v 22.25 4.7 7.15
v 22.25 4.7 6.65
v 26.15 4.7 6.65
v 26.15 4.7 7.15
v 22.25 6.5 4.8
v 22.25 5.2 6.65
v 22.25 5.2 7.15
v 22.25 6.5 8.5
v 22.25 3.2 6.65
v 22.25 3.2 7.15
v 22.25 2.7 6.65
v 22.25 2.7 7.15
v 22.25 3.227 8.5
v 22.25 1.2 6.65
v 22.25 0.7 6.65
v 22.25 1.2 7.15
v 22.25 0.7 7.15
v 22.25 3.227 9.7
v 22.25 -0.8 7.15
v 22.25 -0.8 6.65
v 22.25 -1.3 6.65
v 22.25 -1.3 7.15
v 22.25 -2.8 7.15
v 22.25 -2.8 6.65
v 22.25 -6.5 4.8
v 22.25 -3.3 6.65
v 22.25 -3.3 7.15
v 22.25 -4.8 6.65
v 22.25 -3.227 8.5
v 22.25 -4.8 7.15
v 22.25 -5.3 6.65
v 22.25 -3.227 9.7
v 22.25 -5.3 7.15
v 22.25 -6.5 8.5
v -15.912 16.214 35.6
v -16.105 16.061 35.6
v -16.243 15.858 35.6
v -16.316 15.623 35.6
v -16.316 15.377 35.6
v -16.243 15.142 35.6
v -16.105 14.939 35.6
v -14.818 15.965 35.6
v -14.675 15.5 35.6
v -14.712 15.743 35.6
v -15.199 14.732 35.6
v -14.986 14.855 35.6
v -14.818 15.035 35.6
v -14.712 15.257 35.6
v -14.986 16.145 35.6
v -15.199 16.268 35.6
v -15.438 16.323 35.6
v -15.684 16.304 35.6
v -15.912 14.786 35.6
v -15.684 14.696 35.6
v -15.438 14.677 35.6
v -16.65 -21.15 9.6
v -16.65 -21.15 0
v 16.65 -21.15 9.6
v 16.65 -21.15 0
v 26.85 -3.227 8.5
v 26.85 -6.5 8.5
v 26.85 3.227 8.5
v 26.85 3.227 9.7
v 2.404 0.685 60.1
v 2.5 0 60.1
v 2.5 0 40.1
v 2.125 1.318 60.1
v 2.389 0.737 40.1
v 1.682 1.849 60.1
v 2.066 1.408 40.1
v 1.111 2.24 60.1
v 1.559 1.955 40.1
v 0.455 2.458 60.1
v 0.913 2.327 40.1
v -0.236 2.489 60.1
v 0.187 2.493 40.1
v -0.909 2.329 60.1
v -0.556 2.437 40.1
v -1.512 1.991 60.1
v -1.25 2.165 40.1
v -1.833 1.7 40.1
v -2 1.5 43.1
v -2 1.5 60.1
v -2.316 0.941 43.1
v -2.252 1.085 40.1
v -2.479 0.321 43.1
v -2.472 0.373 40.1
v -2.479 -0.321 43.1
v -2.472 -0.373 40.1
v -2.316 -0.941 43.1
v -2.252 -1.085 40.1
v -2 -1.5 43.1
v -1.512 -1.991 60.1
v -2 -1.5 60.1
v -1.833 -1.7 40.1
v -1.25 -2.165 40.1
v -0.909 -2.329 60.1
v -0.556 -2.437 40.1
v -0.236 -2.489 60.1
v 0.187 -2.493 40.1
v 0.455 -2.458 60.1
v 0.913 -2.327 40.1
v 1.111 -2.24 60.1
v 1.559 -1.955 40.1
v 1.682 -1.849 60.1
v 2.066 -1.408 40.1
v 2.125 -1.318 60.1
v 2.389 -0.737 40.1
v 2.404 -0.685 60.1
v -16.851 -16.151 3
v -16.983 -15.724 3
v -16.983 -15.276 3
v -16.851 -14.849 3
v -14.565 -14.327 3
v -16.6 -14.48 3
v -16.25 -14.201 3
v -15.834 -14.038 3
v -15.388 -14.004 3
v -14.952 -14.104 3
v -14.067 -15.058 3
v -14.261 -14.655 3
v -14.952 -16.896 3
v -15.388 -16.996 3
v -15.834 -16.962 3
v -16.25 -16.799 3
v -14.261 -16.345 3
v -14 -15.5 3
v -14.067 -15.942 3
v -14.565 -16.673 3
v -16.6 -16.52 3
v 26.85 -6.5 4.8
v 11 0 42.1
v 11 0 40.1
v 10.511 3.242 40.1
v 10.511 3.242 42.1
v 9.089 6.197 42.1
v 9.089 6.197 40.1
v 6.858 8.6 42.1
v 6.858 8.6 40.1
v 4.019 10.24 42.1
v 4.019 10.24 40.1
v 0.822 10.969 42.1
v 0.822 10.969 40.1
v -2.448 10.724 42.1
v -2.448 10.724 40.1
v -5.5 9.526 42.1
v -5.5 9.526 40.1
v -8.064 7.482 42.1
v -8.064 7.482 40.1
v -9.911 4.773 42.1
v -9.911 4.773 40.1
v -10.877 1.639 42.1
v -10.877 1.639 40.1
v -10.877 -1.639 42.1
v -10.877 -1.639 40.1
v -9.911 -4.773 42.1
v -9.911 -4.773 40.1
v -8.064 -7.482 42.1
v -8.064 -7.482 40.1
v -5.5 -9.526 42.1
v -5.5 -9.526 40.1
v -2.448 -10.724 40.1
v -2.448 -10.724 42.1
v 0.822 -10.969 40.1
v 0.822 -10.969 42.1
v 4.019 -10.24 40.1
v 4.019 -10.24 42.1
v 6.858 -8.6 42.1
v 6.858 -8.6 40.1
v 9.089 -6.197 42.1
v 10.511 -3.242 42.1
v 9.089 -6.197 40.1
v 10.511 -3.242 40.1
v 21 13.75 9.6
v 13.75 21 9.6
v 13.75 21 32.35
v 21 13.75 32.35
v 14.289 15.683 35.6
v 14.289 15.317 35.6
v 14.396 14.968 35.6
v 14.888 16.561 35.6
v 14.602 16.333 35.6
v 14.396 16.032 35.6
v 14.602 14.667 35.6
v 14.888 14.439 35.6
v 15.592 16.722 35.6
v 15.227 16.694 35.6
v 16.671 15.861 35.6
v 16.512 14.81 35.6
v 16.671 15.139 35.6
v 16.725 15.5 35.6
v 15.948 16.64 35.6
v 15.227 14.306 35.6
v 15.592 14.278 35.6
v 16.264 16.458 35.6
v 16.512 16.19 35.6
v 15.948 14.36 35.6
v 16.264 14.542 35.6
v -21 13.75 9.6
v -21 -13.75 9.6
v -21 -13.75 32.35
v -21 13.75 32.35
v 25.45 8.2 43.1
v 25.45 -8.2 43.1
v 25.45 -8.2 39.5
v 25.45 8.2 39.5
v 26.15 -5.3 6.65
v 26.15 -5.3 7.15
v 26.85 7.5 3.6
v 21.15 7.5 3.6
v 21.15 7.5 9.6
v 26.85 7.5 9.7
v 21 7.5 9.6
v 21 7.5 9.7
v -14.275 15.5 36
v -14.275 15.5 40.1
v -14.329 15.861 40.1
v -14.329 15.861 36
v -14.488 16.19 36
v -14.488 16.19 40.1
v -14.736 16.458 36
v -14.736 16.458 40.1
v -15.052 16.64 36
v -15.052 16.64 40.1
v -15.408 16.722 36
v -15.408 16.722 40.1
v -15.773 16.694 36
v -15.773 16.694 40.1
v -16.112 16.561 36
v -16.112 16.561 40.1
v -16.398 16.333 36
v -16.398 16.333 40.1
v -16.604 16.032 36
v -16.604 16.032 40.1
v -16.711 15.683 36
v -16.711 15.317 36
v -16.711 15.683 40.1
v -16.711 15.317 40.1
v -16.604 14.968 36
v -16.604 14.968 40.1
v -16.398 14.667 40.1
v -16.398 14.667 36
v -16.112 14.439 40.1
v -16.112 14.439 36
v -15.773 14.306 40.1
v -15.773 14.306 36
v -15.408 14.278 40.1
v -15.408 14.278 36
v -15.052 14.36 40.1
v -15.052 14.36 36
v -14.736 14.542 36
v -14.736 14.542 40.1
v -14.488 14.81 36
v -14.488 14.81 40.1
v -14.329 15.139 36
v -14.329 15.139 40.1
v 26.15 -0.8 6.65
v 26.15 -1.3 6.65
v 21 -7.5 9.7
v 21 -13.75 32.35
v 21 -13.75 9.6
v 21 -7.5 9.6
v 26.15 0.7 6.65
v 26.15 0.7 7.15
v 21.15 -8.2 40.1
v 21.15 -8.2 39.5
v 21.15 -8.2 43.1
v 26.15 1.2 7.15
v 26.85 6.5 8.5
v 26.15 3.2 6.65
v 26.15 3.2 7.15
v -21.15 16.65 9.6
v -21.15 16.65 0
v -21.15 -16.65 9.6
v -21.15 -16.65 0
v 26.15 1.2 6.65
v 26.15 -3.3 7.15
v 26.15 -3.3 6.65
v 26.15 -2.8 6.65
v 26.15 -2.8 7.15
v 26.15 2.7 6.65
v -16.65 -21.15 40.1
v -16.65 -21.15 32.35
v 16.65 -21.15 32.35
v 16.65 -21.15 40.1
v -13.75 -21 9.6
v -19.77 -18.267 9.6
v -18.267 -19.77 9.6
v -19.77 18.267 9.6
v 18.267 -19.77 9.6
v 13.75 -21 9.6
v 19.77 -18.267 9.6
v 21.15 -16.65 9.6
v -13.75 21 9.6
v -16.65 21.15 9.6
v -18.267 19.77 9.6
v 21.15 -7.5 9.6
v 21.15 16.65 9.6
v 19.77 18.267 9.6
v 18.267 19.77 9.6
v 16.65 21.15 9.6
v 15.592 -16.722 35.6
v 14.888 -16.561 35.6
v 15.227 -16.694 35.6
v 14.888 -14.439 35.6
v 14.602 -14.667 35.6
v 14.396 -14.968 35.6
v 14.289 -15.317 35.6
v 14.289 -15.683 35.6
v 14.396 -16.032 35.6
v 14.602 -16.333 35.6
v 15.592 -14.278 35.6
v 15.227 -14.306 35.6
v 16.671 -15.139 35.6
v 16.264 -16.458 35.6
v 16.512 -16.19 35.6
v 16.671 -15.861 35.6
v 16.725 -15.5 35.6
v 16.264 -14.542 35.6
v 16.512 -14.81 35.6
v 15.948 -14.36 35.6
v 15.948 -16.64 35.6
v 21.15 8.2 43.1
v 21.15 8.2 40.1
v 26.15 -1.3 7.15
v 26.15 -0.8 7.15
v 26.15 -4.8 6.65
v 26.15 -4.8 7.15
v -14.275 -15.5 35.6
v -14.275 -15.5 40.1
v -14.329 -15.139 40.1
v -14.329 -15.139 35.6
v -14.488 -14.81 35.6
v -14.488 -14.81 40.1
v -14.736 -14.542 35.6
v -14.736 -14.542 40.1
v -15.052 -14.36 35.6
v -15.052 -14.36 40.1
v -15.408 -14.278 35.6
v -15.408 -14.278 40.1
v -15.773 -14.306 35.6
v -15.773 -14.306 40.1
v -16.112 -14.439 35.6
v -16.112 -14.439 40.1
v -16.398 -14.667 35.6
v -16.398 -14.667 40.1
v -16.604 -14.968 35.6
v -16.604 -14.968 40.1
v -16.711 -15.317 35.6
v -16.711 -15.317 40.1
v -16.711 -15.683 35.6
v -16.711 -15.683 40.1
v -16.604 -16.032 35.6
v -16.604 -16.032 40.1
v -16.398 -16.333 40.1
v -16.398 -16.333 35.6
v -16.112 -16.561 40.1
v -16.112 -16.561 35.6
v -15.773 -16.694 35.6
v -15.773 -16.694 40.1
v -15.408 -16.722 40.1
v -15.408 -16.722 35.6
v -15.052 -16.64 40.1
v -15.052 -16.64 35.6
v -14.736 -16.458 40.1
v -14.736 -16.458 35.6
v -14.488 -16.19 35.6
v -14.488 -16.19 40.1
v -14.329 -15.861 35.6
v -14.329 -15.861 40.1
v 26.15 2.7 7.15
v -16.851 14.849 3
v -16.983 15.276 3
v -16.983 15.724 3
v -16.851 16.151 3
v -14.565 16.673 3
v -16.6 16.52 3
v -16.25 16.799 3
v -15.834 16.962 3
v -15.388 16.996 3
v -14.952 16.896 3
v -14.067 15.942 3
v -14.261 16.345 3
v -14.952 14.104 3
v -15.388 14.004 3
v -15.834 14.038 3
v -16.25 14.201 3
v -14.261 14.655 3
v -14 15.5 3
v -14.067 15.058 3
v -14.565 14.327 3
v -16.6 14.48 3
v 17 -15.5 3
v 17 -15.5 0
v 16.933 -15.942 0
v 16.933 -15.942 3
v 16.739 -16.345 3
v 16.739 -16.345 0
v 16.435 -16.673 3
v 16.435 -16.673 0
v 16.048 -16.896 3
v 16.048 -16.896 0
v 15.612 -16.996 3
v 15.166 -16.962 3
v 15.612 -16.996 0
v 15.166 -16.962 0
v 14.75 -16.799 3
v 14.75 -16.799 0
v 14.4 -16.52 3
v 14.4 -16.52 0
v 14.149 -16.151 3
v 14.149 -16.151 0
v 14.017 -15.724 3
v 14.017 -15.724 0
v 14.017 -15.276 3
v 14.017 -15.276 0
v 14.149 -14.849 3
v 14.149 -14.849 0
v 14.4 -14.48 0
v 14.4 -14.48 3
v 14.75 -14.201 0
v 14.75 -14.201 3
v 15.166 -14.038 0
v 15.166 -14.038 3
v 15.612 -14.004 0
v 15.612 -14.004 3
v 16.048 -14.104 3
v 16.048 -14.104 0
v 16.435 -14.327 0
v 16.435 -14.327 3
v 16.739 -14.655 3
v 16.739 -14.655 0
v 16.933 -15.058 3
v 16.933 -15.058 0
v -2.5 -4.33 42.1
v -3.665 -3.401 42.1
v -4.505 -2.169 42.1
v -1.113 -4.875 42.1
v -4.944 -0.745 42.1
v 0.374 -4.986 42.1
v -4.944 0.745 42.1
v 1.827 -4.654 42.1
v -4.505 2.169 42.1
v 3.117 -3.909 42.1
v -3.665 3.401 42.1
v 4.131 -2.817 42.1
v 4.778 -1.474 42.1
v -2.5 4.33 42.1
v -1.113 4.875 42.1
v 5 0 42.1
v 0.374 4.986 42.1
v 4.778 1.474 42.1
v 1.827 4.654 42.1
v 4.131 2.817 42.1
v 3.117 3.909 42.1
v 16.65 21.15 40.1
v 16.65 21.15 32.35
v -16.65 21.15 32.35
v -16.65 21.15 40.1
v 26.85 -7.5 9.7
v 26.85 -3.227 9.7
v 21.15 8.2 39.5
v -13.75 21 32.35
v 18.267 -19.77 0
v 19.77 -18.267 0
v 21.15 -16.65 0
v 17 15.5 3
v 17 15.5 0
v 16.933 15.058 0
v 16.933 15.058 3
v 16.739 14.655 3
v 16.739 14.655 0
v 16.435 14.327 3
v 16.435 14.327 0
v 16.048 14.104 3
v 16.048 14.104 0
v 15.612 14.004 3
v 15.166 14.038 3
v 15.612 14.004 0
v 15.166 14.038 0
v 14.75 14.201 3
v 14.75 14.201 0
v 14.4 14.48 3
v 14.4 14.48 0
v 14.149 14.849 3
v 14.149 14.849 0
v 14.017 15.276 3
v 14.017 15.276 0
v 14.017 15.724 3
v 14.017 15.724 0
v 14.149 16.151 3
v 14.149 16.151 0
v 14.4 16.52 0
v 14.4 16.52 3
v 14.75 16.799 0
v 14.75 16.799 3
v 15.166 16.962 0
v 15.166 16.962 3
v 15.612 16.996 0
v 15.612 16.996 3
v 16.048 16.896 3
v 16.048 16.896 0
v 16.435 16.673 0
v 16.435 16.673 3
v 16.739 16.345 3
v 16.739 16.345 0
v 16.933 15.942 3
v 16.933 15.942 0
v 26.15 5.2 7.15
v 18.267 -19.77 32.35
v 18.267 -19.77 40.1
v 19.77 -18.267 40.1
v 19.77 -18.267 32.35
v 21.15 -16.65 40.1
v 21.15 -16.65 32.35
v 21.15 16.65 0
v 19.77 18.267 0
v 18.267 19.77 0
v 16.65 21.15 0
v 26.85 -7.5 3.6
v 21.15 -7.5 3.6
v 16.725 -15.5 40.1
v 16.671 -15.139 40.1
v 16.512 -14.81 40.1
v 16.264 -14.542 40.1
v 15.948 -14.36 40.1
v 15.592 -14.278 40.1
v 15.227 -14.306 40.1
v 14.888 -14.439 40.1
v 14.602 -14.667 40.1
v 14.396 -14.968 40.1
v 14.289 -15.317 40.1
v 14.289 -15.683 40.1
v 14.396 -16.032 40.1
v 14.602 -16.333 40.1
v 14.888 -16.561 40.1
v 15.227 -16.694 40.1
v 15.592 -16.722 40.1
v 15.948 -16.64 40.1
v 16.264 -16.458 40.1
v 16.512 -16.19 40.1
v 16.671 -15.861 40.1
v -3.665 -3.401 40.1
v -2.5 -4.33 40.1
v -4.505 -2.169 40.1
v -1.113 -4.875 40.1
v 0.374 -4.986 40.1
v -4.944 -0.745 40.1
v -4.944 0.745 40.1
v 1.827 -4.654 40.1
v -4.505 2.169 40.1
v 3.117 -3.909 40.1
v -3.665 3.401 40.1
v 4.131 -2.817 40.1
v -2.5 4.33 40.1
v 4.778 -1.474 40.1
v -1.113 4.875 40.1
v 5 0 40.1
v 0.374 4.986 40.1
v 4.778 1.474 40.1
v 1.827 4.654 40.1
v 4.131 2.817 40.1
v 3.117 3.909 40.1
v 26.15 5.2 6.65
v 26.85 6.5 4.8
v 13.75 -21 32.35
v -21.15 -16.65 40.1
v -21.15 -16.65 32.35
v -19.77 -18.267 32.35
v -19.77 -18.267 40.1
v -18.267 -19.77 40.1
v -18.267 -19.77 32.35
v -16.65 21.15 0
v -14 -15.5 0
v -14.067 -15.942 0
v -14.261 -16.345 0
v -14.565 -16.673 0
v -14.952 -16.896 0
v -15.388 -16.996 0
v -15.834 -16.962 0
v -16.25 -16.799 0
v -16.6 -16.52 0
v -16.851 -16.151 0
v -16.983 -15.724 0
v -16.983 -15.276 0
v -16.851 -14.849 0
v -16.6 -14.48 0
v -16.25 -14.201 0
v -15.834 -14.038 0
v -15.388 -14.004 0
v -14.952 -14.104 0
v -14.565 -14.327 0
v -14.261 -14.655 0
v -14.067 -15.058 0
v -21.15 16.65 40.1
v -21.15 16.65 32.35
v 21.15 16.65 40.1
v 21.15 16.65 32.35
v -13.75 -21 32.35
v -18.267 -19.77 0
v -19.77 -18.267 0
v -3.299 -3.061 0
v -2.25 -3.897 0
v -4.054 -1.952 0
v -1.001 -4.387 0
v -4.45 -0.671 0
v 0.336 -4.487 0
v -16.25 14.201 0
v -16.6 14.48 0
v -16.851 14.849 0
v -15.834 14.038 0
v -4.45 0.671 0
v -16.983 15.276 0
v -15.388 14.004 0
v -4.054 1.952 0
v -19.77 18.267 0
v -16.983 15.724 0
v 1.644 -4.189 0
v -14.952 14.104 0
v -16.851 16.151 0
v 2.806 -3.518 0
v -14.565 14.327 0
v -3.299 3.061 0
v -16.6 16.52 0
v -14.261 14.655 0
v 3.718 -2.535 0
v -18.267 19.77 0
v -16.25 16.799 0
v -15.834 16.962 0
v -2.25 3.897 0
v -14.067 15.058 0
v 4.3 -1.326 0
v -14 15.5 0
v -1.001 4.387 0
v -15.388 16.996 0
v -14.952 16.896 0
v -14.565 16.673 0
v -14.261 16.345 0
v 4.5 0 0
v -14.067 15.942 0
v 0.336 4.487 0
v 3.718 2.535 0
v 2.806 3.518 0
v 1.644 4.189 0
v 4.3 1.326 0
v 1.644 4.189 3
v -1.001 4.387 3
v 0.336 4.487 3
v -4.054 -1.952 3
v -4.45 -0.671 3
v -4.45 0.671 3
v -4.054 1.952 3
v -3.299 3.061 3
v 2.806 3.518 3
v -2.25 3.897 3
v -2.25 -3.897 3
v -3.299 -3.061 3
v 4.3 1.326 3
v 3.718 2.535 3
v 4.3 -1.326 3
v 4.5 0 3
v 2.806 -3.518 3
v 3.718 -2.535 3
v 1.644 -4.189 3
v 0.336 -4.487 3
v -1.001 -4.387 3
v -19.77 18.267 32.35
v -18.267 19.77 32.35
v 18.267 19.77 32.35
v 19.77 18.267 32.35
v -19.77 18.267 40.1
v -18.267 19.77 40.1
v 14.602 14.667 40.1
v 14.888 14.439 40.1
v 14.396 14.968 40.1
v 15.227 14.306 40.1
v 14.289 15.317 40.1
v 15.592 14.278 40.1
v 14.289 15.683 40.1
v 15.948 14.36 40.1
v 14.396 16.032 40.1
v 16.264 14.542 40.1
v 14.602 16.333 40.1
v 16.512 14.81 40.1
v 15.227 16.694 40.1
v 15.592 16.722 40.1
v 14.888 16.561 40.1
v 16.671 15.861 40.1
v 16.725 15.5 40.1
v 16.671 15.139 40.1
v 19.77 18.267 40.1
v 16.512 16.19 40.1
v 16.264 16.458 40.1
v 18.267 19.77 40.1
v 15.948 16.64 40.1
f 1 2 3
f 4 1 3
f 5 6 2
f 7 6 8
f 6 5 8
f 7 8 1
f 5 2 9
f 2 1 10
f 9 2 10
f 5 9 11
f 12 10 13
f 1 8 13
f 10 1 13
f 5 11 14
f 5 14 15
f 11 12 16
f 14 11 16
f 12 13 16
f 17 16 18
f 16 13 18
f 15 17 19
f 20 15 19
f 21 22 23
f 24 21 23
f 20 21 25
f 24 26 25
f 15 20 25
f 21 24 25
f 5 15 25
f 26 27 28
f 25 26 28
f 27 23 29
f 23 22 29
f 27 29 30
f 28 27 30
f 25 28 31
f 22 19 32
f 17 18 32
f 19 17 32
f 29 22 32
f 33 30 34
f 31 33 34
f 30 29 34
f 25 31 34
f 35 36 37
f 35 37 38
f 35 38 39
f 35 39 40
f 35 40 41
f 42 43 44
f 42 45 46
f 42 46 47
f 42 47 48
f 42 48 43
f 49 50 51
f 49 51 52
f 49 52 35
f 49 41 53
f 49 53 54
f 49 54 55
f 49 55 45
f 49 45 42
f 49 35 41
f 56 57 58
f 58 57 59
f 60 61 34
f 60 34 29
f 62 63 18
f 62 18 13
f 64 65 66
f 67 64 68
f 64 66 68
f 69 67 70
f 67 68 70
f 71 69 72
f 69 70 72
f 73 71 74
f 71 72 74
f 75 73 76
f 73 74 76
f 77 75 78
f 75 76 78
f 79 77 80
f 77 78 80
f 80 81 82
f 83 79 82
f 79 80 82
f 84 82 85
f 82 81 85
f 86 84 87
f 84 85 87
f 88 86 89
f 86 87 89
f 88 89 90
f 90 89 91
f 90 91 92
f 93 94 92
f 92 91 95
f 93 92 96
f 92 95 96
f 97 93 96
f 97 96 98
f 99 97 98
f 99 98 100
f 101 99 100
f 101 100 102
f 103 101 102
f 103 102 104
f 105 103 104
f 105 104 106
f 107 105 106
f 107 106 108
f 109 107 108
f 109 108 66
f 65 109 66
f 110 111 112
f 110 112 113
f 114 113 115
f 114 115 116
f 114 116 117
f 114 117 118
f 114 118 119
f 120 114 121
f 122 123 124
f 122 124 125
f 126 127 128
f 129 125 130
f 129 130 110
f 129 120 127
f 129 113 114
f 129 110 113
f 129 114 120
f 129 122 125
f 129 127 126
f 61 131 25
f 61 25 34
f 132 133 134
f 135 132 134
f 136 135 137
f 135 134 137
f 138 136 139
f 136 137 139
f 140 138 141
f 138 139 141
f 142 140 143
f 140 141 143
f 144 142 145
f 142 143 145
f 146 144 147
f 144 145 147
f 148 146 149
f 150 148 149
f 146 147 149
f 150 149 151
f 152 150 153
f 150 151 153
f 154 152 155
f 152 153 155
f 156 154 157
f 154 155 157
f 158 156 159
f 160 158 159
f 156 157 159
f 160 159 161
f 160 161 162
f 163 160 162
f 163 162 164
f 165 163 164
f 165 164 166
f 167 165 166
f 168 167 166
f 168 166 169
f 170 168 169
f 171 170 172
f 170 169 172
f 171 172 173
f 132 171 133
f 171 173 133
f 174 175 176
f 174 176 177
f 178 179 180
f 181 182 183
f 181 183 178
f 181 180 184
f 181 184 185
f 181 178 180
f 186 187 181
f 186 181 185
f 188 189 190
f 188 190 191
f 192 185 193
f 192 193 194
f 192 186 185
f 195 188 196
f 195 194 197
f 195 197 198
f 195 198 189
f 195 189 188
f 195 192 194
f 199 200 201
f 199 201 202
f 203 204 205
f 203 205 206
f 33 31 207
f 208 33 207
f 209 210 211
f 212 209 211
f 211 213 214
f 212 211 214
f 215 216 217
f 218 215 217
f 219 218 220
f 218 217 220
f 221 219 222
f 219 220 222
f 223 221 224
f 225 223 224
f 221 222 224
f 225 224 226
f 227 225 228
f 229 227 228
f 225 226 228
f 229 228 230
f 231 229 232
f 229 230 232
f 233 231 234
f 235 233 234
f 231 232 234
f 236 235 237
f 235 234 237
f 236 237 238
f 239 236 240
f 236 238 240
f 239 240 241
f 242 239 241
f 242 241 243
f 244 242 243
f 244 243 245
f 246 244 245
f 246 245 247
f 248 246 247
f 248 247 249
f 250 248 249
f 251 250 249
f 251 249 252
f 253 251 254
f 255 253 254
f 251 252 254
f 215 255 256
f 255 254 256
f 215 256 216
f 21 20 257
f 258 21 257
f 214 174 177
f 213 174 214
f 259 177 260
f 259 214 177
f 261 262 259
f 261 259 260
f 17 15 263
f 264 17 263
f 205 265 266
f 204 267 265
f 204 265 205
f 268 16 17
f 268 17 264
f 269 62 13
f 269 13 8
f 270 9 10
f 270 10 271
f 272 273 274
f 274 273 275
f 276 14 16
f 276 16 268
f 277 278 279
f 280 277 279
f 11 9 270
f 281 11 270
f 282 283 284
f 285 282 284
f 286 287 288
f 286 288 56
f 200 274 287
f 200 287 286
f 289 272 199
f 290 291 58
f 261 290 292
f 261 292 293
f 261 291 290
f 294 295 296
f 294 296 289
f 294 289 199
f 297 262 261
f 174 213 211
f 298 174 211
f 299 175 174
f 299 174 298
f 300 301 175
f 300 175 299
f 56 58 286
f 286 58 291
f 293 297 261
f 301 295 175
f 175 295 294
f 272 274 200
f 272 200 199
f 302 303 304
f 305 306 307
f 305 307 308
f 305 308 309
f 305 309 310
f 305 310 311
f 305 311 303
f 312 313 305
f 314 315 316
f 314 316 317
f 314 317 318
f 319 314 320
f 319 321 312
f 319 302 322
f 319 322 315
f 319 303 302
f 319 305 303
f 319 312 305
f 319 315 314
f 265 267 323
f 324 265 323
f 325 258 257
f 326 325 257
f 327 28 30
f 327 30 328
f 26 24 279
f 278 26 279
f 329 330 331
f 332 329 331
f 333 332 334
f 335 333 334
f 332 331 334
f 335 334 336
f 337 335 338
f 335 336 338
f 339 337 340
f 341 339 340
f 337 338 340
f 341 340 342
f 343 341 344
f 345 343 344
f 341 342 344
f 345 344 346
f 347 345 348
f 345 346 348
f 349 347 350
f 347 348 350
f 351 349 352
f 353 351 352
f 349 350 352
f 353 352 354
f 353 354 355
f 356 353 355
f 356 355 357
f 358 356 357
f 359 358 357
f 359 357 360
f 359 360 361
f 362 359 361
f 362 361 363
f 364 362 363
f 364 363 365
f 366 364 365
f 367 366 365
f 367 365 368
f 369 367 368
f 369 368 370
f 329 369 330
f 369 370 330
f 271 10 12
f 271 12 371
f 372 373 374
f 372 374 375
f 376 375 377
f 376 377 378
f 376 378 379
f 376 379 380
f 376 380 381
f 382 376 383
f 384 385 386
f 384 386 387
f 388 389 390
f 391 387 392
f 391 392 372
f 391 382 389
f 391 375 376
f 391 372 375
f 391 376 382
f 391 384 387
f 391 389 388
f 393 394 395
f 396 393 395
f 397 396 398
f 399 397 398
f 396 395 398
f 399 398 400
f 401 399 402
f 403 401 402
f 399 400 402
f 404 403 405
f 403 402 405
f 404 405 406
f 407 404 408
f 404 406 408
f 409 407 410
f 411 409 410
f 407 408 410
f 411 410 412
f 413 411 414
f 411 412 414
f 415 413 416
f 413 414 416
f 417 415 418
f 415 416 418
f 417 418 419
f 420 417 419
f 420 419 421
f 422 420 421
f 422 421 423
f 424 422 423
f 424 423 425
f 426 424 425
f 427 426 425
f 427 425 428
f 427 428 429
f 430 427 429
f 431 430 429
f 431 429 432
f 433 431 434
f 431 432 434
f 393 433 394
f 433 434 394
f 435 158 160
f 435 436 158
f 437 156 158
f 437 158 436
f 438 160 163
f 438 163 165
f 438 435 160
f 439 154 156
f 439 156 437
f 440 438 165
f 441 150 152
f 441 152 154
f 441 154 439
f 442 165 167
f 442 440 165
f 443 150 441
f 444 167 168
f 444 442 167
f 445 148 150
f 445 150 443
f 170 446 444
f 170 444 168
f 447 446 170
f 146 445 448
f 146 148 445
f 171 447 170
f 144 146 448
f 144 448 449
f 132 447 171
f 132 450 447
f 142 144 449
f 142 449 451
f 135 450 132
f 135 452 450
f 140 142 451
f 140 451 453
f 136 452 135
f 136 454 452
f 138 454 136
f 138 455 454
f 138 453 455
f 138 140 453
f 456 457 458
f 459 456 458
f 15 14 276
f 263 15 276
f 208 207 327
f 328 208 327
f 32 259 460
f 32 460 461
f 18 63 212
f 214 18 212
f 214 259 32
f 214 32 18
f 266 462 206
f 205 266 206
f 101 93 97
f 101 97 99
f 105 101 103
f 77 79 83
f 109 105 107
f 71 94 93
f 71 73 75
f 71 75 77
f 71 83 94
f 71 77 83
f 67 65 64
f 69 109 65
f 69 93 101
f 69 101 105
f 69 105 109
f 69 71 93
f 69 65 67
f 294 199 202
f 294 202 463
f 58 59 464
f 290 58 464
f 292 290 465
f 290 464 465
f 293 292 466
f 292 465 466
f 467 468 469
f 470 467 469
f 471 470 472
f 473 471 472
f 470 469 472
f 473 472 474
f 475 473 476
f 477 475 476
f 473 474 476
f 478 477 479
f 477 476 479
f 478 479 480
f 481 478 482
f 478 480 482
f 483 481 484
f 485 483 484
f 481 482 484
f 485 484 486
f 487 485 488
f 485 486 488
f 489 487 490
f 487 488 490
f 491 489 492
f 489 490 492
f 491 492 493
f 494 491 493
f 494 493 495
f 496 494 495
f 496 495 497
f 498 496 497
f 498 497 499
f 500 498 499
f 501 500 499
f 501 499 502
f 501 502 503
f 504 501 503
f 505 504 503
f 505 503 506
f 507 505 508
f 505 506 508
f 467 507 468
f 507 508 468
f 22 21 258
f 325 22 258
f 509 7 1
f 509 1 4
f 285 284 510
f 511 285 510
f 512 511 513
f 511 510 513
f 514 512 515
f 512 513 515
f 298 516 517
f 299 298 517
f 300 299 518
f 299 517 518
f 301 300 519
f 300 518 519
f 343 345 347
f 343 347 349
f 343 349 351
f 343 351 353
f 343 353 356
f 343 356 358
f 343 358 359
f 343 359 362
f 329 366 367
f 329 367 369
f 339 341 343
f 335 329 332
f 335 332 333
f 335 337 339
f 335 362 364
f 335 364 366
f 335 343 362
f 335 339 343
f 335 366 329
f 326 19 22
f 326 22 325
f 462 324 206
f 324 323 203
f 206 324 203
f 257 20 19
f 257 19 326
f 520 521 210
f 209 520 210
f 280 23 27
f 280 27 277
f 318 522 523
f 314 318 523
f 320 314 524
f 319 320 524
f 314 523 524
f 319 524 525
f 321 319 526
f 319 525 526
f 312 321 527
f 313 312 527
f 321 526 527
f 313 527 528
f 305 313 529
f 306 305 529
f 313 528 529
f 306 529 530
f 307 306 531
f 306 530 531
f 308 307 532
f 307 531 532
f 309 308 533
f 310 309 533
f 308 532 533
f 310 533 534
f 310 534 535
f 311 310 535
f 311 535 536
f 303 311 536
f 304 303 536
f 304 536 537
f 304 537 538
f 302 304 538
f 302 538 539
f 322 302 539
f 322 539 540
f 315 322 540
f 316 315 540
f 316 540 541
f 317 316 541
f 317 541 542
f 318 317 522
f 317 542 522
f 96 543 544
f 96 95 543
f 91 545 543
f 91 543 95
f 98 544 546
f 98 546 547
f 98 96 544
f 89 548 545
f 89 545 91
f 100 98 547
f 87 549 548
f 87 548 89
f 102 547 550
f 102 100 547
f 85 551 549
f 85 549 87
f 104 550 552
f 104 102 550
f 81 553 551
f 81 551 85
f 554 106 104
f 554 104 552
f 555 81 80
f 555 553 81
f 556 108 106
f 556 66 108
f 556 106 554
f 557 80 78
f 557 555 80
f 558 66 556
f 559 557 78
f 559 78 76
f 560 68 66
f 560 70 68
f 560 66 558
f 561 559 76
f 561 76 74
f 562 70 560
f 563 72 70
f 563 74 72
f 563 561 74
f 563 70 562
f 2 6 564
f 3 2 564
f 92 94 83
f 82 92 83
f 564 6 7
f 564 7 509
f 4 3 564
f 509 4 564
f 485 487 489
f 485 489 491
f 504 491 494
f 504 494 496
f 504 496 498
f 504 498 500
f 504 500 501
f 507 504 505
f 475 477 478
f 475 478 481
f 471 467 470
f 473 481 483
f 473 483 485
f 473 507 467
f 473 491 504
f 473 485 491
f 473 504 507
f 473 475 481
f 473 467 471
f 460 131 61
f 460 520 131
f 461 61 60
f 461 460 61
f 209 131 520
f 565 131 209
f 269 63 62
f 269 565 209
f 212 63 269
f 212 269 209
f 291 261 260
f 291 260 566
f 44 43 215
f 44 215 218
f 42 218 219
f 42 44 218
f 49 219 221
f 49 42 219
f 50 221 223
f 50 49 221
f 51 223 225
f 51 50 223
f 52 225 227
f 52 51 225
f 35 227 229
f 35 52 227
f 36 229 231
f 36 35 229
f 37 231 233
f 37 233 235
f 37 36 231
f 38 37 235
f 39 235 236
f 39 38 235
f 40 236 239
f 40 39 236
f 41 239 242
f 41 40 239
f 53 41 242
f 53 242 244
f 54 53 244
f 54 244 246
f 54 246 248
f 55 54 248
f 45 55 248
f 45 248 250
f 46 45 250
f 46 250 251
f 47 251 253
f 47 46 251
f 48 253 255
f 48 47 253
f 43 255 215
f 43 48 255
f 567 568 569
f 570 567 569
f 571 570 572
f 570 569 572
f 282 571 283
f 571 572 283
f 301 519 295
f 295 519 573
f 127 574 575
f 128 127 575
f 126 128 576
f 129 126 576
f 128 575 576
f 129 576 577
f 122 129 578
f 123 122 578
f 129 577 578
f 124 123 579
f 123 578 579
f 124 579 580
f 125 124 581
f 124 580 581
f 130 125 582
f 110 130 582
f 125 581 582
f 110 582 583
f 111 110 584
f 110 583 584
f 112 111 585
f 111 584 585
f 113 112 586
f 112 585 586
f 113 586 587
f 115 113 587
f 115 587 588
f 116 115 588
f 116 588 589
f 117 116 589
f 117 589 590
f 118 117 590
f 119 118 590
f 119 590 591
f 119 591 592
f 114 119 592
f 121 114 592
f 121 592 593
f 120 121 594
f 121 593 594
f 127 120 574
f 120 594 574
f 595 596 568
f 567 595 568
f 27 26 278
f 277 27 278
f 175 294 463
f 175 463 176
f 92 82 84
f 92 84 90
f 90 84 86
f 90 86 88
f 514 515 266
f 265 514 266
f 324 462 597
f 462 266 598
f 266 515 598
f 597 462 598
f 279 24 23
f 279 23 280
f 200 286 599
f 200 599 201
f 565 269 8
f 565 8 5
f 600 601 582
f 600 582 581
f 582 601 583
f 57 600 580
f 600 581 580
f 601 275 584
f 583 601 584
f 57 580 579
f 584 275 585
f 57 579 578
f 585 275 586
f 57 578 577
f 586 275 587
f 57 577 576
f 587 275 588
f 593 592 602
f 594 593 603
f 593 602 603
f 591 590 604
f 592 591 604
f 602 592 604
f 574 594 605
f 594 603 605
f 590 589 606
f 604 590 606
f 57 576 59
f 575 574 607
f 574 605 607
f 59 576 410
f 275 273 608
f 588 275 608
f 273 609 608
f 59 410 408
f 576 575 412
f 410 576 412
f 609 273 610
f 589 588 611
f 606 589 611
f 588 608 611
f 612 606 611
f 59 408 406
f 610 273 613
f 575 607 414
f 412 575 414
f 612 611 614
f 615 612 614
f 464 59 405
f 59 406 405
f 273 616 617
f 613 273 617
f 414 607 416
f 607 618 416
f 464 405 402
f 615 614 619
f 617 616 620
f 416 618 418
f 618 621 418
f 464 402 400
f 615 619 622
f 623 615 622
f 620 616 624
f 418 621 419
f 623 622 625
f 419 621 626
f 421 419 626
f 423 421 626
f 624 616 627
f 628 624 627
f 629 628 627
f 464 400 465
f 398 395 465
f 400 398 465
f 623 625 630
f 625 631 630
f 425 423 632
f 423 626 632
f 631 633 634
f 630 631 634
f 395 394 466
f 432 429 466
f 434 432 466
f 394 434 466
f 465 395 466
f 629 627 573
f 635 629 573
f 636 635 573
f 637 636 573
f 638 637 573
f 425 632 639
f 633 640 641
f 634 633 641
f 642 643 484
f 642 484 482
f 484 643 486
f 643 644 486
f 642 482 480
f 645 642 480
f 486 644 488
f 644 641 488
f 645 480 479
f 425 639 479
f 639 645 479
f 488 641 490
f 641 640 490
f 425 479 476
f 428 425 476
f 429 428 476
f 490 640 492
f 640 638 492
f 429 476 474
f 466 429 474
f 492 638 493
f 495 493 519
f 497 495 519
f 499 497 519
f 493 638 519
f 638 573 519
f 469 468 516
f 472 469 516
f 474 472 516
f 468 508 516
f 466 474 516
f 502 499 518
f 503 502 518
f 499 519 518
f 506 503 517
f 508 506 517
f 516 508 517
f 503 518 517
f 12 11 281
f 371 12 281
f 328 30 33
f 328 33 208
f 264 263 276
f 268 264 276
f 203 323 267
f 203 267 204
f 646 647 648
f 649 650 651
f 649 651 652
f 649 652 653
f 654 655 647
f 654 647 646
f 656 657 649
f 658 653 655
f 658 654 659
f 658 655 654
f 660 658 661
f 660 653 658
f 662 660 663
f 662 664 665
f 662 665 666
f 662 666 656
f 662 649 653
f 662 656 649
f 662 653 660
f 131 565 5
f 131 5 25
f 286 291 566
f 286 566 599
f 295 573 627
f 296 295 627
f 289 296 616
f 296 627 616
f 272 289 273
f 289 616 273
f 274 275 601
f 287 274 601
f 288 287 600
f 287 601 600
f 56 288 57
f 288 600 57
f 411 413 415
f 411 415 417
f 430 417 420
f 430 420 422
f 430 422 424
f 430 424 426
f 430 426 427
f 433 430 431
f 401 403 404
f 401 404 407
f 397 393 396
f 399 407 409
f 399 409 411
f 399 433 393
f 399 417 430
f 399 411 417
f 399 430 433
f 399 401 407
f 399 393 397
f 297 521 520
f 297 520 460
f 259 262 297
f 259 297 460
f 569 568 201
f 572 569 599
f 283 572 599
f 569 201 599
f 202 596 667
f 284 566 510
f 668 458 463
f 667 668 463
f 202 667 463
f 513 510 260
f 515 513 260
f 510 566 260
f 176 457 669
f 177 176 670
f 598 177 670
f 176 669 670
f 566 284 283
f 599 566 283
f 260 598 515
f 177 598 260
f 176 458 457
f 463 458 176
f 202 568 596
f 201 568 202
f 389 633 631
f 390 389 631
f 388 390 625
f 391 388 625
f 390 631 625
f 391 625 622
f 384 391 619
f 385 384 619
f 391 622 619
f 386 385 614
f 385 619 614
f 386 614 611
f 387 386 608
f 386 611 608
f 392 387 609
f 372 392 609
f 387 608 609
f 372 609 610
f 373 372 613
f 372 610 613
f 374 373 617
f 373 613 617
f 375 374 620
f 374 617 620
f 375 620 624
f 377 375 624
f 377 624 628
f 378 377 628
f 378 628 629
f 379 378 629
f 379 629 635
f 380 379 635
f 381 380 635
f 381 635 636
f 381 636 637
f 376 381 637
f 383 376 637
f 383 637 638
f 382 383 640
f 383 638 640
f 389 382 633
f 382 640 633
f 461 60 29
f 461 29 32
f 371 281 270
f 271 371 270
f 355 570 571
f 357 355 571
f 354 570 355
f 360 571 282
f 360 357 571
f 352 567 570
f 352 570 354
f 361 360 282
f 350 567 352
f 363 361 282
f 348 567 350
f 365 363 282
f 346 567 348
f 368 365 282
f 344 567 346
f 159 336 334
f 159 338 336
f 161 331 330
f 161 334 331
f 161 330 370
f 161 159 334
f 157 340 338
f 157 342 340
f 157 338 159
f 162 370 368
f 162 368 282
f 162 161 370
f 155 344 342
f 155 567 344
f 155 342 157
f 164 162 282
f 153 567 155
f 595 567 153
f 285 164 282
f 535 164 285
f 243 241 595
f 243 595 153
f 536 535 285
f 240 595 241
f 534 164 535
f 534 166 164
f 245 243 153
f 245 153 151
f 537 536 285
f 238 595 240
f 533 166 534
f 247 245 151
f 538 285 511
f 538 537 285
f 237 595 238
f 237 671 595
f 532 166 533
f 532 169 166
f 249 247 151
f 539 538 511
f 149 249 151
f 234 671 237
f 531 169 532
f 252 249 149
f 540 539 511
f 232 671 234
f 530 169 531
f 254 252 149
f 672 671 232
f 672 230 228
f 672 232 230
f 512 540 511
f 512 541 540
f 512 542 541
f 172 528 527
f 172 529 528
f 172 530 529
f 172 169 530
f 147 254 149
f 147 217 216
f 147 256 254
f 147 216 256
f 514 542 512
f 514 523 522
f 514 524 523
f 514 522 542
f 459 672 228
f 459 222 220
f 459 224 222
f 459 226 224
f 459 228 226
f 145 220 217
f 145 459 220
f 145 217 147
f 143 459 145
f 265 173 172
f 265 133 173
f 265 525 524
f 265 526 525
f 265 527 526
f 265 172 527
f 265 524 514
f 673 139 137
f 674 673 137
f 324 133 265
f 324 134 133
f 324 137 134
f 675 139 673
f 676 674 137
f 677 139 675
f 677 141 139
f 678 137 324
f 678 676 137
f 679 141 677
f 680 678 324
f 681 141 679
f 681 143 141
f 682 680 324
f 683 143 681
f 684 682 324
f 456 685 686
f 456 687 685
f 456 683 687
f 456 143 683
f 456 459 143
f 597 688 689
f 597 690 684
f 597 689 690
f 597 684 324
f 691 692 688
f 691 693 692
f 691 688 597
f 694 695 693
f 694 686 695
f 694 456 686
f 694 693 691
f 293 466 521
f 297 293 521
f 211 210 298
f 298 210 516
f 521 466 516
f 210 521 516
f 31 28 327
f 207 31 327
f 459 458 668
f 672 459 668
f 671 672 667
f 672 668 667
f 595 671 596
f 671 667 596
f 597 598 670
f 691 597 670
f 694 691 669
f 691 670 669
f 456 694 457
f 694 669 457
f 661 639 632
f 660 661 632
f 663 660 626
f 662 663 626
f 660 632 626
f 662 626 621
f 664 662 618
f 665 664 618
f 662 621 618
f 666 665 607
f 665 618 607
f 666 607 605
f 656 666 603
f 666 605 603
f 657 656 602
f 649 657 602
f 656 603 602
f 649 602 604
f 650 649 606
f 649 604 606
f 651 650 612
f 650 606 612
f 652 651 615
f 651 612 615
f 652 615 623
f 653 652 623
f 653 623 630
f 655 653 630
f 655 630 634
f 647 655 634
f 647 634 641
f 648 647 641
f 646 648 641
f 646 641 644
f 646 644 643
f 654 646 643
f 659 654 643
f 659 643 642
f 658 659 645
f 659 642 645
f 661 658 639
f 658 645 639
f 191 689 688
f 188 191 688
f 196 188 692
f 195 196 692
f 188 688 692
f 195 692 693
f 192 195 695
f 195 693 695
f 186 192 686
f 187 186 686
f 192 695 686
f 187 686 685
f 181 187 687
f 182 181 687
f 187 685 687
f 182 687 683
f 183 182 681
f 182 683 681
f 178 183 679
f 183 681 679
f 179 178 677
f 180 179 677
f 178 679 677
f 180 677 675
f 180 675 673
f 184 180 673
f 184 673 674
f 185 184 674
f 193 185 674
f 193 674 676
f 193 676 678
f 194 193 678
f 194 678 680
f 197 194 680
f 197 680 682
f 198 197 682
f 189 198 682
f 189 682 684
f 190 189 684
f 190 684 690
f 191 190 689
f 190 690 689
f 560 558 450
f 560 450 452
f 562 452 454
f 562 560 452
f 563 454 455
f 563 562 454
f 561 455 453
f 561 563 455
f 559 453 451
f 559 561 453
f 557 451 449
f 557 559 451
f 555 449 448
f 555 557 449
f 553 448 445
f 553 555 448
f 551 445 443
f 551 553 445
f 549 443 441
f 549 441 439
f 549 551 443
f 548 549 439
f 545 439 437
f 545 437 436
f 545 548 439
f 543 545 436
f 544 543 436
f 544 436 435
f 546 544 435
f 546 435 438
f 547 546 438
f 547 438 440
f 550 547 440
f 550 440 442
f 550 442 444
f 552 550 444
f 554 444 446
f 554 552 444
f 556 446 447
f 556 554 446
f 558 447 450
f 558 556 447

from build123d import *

# Parameters (mm, degrees)
BOX_W           = 4
BOX_H           = 0.5
BOX_DEPTH       = 0.5
ARRAY_Y_COUNT   = 6
ARRAY_Y_PITCH   = 2
SKETCH017_W     = 15
SKETCH017_H     = 6.1
PAD008_DEPTH    = 6.7
POCKET007_DEPTH = 4.6
PAD002_DEPTH    = 9.6
PAD003_DEPTH    = 22.75
PAD004_DEPTH    = 7.75
SKETCH010_R     = 1.225
POCKET003_DEPTH = 4.5
SKETCH011_R     = 11
SKETCH011_R_2   = 5
PAD005_DEPTH    = 2
SKETCH012_R     = 2.5
PAD006_DEPTH    = 20
SKETCH013_W     = 0.5
SKETCH013_H     = 3
POCKET004_DEPTH = 17
SKETCH014_R     = 1.5
SKETCH014_R_2   = 4.5
POCKET005_DEPTH = 3
CHAMFER004_SIZE = 0.4
SKETCH015_W     = 4.3
SKETCH015_H     = 16.4
PAD007_DEPTH    = 3.6
SKETCH016_W     = 16.4
SKETCH016_H     = 6
POCKET006_DEPTH = 1


with BuildPart() as pins:
    # Box → Box (new body)
    with BuildSketch(Plane.XY):
        with Locations((2, 0.25)):
            Rectangle(BOX_W, BOX_H)
    extrude(amount=BOX_DEPTH)

    # Array Y: pins ×6


with BuildPart() as pins_1:
    add(pins.part)
    with Locations(*[(0, i * ARRAY_Y_PITCH, 0) for i in range(1, ARRAY_Y_COUNT)]):
        add(pins.part)


with BuildPart() as pins_2:
    # Array placement: moved
    add(pins_1.part.moved(Location((2, -5.3, 0))))


with BuildPart() as connector:
    # Sketch017 → Pad008 (new body)
    with BuildSketch(Plane.YZ):
        Rectangle(SKETCH017_W, SKETCH017_H)
    extrude(amount=PAD008_DEPTH)

    # Sketch018 (on Face6 of Pad008) → Pocket007 (cut)
    with BuildSketch(Plane.YZ.offset(6.7)):
        Polygon((-6.5, 1.85), (-3.227377, 1.85), (-3.227377, 3.85), (3.227377, 3.85), (3.227377, 1.85), (6.5, 1.85), (6.5, -1.85), (-6.5, -1.85), align=None)
    extrude(amount=-POCKET007_DEPTH, mode=Mode.SUBTRACT)

    # Fusion001: union pins
    add(pins_2.part)


with BuildPart() as connector_1:
    # Fusion001 placement: moved
    add(connector.part.moved(Location((20.15, 0, 6.65))))


with BuildPart() as motor_with_connector:
    # Sketch007 → Pad002 (new body)
    with BuildSketch(Plane.XY):
        with BuildLine():
            Line((-16.65, -21.15), (16.65, -21.15))
            ThreePointArc((16.65, -21.15), (19.033457, -19.033457), (21.15, -16.65))
            Line((21.15, -16.65), (21.15, 16.65))
            ThreePointArc((21.15, 16.65), (19.033457, 19.033457), (16.65, 21.15))
            Line((16.65, 21.15), (-16.65, 21.15))
            ThreePointArc((-16.65, 21.15), (-19.033457, 19.033457), (-21.15, 16.65))
            Line((-21.15, 16.65), (-21.15, -16.65))
            ThreePointArc((-21.15, -16.65), (-19.033457, -19.033457), (-16.65, -21.15))
        make_face()
    extrude(amount=PAD002_DEPTH)

    # Sketch008 (on Face10 of Pad002) → Pad003 (new body)
    with BuildSketch(Plane.XY.offset(9.6)):
        Polygon((-21, -13.75), (-21, 13.75), (-13.75, 21), (13.75, 21), (21, 13.75), (21, -13.75), (13.75, -21), (-13.75, -21), align=None)
    extrude(amount=PAD003_DEPTH)

    # Sketch009 (on Face19 of Pad003) → Pad004 (new body)
    with BuildSketch(Plane.XY.offset(32.35)):
        with BuildLine():
            Line((-16.65, -21.15), (16.65, -21.15))
            ThreePointArc((16.65, -21.15), (19.033457, -19.033457), (21.15, -16.65))
            Line((21.15, -16.65), (21.15, 16.65))
            ThreePointArc((21.15, 16.65), (19.033457, 19.033457), (16.65, 21.15))
            Line((16.65, 21.15), (-16.65, 21.15))
            ThreePointArc((-16.65, 21.15), (-19.033457, 19.033457), (-21.15, 16.65))
            Line((-21.15, 16.65), (-21.15, -16.65))
            ThreePointArc((-21.15, -16.65), (-19.033457, -19.033457), (-16.65, -21.15))
        make_face()
    extrude(amount=PAD004_DEPTH)

    # Sketch010 (on Face28 of Pad004) → Pocket003 (cut)
    with BuildSketch(Plane.XY.offset(40.1)):
        with Locations((-15.5, 15.5)):
            Circle(SKETCH010_R)
        with Locations((15.5, 15.5)):
            Circle(SKETCH010_R)
        with Locations((15.5, -15.5)):
            Circle(SKETCH010_R)
        with Locations((-15.5, -15.5)):
            Circle(SKETCH010_R)
    extrude(amount=-POCKET003_DEPTH, mode=Mode.SUBTRACT)

    # Sketch011 (on Face28 of Pocket003) → Pad005 (new body)
    with BuildSketch(Plane.XY.offset(40.1)):
        Circle(SKETCH011_R)
        Circle(SKETCH011_R_2, mode=Mode.SUBTRACT)
    extrude(amount=PAD005_DEPTH)

    # Sketch012 (on Face40 of Pad005) → Pad006 (new body)
    with BuildSketch(Plane.XY.offset(40.1)):
        Circle(SKETCH012_R)
    extrude(amount=PAD006_DEPTH)

    # Sketch013 (on Face42 of Pad006) → Pocket004 (cut)
    with BuildSketch(Plane.XY.offset(60.1)):
        with Locations((-2.25, 0)):
            Rectangle(SKETCH013_W, SKETCH013_H)
    extrude(amount=-POCKET004_DEPTH, mode=Mode.SUBTRACT)

    # Sketch014 (on Face4 of Pocket004) → Pocket005 (cut)
    with BuildSketch(Plane(origin=(0, 0, 0), x_dir=(1, 0, 0), z_dir=(0, 0, -1))):
        with Locations((-15.5, 15.5)):
            Circle(SKETCH014_R)
        with Locations((15.5, 15.5)):
            Circle(SKETCH014_R)
        with Locations((15.5, -15.5)):
            Circle(SKETCH014_R)
        with Locations((-15.5, -15.5)):
            Circle(SKETCH014_R)
        Circle(SKETCH014_R_2)
    extrude(amount=-POCKET005_DEPTH, mode=Mode.SUBTRACT)

    # Chamfer004
    chamfer004_edges = [motor_with_connector.edges().sort_by_distance(p)[0] for p in [
        (-16.725, 15.5, 35.6),
    ]]
    chamfer(chamfer004_edges, length=CHAMFER004_SIZE)

    # Sketch015 (on Face45 of Chamfer004) → Pad007 (new body)
    with BuildSketch(Plane.XY.offset(43.1)):
        with Locations((23.3, 0)):
            Rectangle(SKETCH015_W, SKETCH015_H)
    extrude(amount=-PAD007_DEPTH)

    # Sketch016 (on Face5 of Pad007) → Pocket006 (cut)
    with BuildSketch(Plane(origin=(21.15, 0, 0), x_dir=(0, -1, 0), z_dir=(-1, 0, 0))):
        with Locations((0, 6.6)):
            Rectangle(SKETCH016_W, SKETCH016_H)
    extrude(amount=-POCKET006_DEPTH, mode=Mode.SUBTRACT)

    # Fusion002: union connector
    add(connector_1.part)


solid = motor_with_connector.part
